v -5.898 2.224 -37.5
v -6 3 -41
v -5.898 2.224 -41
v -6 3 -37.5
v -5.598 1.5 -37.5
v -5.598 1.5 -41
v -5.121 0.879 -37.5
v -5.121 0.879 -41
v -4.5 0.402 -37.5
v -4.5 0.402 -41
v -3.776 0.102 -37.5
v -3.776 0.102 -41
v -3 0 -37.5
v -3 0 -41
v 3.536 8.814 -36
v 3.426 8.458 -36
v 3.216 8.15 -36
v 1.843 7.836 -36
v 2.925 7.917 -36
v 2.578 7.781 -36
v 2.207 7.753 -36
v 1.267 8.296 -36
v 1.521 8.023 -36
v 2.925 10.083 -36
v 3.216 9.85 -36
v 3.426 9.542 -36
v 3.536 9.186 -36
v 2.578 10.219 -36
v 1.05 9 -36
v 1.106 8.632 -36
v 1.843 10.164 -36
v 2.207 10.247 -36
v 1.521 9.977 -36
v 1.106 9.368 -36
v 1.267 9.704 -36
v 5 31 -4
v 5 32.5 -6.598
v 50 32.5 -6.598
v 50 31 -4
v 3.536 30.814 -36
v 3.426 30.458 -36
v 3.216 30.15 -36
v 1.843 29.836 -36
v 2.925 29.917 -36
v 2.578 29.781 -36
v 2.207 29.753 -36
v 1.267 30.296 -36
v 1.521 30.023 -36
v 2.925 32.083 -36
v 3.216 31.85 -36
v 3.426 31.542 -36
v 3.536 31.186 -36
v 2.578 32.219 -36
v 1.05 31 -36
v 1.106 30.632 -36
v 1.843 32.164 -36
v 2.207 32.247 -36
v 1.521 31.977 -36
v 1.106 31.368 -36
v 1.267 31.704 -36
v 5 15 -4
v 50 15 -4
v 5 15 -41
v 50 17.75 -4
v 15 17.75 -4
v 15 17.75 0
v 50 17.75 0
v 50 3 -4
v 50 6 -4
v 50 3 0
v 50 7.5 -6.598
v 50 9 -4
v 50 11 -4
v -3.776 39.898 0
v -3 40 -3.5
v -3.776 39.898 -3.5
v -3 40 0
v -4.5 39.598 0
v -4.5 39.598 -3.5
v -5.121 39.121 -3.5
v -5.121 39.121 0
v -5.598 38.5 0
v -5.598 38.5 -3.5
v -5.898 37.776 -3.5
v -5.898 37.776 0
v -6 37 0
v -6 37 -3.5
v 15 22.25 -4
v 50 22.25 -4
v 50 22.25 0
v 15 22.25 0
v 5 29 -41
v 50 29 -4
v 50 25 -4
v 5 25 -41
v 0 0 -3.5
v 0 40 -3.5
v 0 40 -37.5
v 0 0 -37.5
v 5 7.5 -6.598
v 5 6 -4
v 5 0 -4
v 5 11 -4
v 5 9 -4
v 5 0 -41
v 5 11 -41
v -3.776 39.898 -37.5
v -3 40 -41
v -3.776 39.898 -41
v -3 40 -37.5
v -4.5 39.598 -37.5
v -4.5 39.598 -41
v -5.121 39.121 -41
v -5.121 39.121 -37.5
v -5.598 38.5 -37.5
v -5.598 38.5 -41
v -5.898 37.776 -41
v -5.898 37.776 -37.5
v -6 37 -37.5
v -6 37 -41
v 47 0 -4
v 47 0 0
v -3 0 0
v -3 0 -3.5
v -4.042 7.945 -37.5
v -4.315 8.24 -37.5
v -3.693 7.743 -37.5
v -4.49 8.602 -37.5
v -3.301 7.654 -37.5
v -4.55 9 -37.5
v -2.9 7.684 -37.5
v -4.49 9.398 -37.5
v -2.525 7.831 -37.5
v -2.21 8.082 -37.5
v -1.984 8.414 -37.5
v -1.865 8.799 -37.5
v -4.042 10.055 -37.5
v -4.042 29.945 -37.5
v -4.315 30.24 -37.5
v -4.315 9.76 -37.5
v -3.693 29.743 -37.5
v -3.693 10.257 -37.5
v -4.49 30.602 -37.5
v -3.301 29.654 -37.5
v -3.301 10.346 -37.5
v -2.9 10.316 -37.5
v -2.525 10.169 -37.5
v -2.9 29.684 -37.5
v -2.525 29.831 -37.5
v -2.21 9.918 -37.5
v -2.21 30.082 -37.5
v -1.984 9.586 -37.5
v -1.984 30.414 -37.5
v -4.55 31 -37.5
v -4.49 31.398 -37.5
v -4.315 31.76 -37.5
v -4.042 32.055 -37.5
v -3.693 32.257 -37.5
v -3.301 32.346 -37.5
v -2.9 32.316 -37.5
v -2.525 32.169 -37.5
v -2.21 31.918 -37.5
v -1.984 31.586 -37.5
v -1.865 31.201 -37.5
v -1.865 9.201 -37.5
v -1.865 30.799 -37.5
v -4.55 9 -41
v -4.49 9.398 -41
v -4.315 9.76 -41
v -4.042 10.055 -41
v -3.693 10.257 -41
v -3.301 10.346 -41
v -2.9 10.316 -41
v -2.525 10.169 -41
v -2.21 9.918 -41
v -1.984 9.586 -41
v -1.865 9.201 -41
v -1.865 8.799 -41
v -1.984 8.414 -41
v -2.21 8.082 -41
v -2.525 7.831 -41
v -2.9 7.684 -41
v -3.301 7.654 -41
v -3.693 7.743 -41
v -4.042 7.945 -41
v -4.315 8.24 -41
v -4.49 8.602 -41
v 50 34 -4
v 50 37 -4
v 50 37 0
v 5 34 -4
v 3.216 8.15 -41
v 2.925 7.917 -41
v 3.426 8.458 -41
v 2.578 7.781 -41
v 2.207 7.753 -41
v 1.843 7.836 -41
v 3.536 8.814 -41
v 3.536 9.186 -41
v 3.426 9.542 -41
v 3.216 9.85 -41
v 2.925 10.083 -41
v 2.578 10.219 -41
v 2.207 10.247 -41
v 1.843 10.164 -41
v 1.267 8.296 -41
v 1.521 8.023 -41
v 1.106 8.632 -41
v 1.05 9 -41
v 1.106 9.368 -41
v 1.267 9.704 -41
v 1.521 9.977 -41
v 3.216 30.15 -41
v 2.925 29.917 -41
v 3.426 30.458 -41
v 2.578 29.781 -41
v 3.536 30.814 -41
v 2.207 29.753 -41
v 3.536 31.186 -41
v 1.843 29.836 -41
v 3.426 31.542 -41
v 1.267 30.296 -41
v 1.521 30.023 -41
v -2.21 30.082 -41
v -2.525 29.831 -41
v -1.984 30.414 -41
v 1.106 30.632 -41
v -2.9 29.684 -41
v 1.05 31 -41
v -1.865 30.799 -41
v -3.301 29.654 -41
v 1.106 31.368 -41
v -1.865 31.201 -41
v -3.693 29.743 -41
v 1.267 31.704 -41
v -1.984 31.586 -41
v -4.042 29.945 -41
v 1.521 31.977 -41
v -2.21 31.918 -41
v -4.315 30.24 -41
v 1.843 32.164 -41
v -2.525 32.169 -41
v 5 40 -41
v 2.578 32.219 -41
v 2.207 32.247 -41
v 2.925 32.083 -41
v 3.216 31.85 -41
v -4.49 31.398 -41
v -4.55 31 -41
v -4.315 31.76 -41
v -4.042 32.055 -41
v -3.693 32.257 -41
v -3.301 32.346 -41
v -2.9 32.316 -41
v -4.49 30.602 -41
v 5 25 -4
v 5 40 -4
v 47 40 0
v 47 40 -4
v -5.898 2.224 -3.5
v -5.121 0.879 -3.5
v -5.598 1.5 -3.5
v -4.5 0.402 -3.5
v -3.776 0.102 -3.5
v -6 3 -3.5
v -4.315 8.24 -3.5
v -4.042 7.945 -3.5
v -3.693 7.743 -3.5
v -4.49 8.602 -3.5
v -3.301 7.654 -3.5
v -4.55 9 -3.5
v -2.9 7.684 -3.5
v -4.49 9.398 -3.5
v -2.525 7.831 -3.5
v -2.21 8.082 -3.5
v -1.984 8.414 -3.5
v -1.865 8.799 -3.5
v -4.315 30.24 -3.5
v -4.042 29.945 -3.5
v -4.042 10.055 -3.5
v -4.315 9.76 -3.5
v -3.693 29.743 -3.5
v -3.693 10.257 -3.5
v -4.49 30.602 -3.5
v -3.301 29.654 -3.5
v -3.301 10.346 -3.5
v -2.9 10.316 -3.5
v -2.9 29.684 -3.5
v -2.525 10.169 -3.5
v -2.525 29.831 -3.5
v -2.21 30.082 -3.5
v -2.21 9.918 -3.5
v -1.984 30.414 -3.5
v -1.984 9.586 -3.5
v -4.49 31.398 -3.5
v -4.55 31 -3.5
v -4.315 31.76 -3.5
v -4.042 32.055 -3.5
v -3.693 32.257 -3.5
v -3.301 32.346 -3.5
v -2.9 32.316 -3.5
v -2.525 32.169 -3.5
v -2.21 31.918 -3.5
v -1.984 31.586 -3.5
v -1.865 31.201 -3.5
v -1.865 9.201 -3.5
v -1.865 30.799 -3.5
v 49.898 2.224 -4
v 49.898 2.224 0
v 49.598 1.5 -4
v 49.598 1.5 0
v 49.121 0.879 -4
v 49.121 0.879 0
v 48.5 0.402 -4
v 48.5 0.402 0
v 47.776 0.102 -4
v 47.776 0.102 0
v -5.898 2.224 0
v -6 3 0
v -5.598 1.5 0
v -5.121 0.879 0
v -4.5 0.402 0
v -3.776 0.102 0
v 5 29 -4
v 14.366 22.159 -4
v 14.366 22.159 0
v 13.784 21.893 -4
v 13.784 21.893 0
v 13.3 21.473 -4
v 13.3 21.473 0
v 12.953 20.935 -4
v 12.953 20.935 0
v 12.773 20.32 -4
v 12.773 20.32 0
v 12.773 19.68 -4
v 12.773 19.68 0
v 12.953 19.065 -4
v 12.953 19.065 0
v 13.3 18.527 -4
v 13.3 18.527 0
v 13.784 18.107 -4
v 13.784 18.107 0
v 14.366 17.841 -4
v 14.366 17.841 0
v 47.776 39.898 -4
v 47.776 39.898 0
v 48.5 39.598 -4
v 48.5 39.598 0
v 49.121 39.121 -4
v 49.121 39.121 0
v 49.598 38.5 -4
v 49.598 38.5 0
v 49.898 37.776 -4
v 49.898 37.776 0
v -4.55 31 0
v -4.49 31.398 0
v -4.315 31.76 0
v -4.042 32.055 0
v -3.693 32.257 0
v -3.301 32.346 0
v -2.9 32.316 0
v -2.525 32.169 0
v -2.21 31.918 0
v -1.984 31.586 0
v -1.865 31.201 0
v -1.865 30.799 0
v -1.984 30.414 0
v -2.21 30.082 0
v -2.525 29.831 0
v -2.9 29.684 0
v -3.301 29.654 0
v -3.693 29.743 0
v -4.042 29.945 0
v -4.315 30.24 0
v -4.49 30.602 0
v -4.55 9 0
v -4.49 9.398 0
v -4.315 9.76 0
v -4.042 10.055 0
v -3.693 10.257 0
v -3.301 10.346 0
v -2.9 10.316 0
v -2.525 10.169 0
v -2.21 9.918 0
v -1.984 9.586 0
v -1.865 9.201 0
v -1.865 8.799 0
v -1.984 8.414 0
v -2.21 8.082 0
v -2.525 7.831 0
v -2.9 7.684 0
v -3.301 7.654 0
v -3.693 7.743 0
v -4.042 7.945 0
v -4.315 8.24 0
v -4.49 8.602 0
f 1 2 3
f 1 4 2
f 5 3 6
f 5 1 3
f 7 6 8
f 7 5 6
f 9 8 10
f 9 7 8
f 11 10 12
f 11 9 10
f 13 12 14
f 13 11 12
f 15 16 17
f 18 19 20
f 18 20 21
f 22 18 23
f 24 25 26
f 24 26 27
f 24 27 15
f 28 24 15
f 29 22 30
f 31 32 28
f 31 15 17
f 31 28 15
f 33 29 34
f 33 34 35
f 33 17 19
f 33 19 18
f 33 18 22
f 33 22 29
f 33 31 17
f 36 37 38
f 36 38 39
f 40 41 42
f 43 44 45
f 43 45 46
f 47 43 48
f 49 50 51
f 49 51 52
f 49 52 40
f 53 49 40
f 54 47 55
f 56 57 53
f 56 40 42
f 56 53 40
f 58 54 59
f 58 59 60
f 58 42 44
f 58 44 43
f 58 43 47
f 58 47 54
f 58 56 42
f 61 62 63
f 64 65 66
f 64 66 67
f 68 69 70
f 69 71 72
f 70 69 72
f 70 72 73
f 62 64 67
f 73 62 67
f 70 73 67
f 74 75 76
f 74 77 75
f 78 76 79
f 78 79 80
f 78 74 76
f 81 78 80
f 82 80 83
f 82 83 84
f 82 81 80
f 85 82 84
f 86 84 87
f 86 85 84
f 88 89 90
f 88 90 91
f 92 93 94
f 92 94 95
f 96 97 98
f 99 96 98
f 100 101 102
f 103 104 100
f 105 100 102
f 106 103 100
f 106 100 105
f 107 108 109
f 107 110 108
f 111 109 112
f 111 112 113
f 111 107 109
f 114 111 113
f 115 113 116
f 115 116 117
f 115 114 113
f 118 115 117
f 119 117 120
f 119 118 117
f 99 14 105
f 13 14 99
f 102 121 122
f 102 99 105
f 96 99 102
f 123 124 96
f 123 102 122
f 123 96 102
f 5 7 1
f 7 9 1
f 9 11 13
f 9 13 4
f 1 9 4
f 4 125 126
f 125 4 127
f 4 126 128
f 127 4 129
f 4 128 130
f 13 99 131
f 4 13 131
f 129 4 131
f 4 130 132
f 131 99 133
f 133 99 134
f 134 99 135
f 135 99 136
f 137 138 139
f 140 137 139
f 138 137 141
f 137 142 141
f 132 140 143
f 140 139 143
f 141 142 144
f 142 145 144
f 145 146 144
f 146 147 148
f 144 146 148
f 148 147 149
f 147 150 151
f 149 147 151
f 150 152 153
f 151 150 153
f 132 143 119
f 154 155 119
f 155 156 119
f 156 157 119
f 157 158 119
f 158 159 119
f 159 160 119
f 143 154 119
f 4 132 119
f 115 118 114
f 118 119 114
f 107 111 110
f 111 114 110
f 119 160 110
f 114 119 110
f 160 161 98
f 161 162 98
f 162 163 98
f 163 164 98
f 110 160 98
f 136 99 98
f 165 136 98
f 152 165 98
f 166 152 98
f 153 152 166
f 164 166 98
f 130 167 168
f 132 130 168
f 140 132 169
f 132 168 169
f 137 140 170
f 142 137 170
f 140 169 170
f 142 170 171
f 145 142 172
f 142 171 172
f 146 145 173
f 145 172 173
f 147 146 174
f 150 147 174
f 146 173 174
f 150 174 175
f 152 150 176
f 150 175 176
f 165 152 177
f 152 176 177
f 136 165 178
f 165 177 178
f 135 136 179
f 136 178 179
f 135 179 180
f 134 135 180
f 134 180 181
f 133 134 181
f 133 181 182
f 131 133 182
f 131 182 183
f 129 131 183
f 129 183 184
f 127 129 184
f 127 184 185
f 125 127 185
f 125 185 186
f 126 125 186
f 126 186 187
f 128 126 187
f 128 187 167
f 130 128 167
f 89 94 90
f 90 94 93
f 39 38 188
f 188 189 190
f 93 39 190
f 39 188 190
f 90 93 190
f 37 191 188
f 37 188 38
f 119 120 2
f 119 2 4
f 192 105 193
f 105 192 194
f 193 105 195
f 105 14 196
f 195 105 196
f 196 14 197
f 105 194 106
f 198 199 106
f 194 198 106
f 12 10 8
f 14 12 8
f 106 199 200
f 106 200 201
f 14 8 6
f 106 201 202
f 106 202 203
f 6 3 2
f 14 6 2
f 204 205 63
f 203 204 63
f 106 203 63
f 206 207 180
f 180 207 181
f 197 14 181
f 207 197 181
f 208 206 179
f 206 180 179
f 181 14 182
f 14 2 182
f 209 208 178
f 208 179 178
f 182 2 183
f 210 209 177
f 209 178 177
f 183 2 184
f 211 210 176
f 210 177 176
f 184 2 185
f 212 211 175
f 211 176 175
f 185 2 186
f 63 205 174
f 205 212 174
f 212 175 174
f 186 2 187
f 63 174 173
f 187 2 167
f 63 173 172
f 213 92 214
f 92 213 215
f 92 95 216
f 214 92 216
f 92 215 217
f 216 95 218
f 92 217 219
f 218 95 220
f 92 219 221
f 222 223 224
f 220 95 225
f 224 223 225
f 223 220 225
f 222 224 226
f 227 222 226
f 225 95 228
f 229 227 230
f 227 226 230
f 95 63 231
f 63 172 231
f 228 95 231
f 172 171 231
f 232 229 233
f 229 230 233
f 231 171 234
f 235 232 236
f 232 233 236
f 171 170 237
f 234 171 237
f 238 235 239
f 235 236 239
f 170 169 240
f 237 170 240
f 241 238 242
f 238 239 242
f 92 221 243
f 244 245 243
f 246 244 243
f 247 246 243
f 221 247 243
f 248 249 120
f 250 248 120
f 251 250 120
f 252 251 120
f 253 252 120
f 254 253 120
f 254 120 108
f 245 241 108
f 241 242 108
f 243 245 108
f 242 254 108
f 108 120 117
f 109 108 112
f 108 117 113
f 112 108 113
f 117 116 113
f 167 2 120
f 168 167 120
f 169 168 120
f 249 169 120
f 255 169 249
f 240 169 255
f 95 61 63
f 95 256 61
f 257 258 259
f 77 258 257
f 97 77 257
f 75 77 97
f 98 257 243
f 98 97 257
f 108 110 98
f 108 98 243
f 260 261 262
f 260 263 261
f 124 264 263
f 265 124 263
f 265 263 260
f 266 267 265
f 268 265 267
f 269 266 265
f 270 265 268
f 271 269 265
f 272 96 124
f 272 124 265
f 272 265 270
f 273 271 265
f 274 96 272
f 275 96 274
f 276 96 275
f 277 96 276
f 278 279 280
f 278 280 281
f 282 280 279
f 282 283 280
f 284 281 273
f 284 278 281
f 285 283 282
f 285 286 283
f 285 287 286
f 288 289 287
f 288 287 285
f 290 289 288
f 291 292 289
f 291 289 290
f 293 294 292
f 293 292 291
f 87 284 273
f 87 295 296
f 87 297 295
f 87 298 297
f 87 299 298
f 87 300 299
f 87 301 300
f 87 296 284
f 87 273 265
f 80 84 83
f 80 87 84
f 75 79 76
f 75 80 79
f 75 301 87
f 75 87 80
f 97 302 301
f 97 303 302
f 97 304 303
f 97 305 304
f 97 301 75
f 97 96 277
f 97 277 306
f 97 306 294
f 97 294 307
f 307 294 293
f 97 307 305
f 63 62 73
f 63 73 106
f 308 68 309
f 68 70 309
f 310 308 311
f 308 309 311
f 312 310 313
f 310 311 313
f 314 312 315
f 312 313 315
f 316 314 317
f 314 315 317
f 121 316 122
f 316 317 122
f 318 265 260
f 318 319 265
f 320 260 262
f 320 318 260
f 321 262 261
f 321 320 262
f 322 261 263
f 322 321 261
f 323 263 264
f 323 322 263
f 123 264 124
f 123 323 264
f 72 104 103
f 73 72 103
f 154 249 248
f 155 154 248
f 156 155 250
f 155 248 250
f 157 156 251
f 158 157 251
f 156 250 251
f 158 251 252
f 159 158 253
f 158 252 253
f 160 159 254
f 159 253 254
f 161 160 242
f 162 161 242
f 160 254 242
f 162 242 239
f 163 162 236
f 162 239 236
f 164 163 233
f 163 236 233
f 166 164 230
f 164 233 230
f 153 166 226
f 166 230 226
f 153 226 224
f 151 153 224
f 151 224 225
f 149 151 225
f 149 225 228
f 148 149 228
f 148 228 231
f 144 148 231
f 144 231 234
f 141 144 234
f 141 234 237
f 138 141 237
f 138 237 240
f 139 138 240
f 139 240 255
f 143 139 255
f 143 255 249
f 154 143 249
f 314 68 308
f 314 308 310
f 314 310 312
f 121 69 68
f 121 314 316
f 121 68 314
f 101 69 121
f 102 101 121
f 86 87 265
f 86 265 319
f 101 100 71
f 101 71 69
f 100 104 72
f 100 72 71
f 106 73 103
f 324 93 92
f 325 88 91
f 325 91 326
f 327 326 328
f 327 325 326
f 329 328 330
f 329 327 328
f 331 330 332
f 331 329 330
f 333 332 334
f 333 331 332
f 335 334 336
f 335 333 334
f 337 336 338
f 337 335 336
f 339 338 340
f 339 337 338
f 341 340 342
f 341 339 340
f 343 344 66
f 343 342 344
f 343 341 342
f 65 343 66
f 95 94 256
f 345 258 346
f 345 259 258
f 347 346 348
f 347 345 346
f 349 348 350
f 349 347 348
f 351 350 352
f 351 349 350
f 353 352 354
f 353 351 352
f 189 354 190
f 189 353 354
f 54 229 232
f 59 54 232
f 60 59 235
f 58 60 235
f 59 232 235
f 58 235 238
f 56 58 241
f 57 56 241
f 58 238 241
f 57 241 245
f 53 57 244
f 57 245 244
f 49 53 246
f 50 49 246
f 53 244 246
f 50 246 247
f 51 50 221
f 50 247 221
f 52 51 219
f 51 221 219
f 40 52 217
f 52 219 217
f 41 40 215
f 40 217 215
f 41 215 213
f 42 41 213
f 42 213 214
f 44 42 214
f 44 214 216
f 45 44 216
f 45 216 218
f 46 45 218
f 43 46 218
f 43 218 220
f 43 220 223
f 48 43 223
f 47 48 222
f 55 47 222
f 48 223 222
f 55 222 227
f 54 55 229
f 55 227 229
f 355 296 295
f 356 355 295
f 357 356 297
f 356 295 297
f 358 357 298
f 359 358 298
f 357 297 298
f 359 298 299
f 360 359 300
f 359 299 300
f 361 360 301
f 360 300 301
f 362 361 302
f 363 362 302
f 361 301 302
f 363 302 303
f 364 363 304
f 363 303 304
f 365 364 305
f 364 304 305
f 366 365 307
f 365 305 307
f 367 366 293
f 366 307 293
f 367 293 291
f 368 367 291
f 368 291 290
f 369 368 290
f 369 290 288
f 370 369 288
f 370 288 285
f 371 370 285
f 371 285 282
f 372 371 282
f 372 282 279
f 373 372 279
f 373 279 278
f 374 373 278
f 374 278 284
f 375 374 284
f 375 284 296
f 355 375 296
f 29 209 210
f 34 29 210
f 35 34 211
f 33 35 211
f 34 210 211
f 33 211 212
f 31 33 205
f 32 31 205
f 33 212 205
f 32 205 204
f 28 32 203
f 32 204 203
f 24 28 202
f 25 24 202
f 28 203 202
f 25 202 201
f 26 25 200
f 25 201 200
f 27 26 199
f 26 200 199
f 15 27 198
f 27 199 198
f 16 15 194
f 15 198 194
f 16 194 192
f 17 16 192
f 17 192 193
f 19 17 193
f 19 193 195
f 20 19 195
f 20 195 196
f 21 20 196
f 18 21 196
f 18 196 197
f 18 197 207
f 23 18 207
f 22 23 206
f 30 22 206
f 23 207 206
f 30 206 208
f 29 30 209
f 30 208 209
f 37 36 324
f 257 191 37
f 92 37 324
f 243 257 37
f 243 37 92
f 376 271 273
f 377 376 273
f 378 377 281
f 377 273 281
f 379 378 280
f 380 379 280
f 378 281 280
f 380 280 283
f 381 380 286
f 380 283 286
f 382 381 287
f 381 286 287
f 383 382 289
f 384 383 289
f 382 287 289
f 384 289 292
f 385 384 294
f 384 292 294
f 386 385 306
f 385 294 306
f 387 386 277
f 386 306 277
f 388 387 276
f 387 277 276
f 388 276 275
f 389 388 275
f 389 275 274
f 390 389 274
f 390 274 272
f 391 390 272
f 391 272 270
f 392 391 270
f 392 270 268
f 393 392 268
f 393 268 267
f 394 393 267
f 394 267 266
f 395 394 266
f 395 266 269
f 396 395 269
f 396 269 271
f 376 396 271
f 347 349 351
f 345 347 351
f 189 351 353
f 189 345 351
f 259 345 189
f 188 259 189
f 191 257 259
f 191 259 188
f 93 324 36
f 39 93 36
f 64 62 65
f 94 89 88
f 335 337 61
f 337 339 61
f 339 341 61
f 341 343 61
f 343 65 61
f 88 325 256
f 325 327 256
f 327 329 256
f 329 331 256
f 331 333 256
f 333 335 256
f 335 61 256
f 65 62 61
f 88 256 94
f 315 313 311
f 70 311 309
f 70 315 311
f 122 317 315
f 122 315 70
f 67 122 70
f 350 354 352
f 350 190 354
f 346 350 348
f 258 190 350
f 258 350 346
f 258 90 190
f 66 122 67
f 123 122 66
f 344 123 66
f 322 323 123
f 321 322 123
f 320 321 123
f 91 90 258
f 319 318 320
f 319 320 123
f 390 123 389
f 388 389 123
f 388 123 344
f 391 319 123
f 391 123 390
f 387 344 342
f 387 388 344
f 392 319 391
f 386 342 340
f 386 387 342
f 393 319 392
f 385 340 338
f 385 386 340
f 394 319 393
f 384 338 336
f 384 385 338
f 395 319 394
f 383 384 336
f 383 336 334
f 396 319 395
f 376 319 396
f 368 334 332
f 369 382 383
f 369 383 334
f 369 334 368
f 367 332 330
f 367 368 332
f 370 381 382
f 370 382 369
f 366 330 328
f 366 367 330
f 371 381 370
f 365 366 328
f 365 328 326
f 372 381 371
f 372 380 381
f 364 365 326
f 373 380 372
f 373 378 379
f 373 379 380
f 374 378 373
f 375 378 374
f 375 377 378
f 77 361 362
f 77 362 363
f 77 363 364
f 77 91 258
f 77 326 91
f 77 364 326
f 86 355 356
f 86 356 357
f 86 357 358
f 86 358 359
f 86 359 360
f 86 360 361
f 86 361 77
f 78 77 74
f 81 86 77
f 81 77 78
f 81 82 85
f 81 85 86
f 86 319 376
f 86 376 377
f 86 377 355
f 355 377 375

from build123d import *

# Parameters (mm, degrees)
SKETCH_1_W               = 41
SKETCH_1_H               = 40
EXTRUDE_1_DEPTH          = 5
SKETCH_2_W               = 3.5
SKETCH_2_H               = 40
EXTRUDE_2_DEPTH          = 6
EXTRUDE_3_DEPTH          = 45
SKETCH_4_W               = 45
SKETCH_4_H               = 4
EXTRUDE_4_DEPTH          = 37
CUT_EXTRUDE_1_DEPTH      = 19
SKETCH_6_R               = 1.35
CUT_EXTRUDE_2_DEPTH      = 42
FILLET_1_R               = 3
FILLET_2_R               = 3
CUT_EXTRUDE_3_DEPTH      = 38
CUT_EXTRUDE_3_DEPTH_BACK = 5
SKETCH_8_R               = 1.25
CUT_EXTRUDE_4_DEPTH      = 5


with BuildPart() as part:
    # 스케치1 → 보스-돌출1 (new body)
    with BuildSketch(Plane(origin=(0, 0, 0), x_dir=(0, 0, -1), z_dir=(1, 0, 0))):
        with Locations((20.5, 20)):
            Rectangle(SKETCH_1_W, SKETCH_1_H)
    extrude(amount=EXTRUDE_1_DEPTH)

    # 스케치2 → 보스-돌출2 (add)
    with BuildSketch(Plane.ZY):
        with Locations((-1.75, 20)):
            Rectangle(SKETCH_2_W, SKETCH_2_H)
        with Locations((-39.25, 20)):
            Rectangle(SKETCH_2_W, SKETCH_2_H)
    extrude(amount=EXTRUDE_2_DEPTH)

    # 스케치3 → 보스-돌출3 (add)
    with BuildSketch(Plane(origin=(5, 0, 0), x_dir=(0, 0, -1), z_dir=(1, 0, 0))):
        Polygon((0, 40), (4, 40), (4, 34), (6.598076211, 32.5), (4, 31), (4, 14), (4, 12), (4, 9), (6.598076211, 7.5), (4, 6), (4, 0), (0, 0), align=None)
    extrude(amount=EXTRUDE_3_DEPTH)

    # 스케치4 → 보스-돌출4 (add)
    with BuildSketch(Plane(origin=(0, 0, -4), x_dir=(-1, 0, 0), z_dir=(0, 0, -1))):
        with Locations((-27.5, 27)):
            Rectangle(SKETCH_4_W, SKETCH_4_H)
        with Locations((-27.5, 13)):
            Rectangle(SKETCH_4_W, SKETCH_4_H)
    extrude(amount=EXTRUDE_4_DEPTH)

    # 스케치5 → 컷-돌출1 (cut)
    with BuildSketch(Plane(origin=(0, 29, 0), x_dir=(1, 0, 0), z_dir=(0, 1, 0))):
        Polygon((50, 4), (5, 41), (50, 41), align=None)
    extrude(amount=-CUT_EXTRUDE_1_DEPTH, mode=Mode.SUBTRACT)

    # 스케치6 → 컷-돌출2 (cut, through all)
    with BuildSketch(Plane(origin=(0, 0, -41), x_dir=(-1, 0, 0), z_dir=(0, 0, -1))):
        with Locations((3.2, 9)):
            Circle(SKETCH_6_R)
        with Locations((3.2, 31)):
            Circle(SKETCH_6_R)
    extrude(amount=-CUT_EXTRUDE_2_DEPTH, mode=Mode.SUBTRACT)

    # 필렛1
    fillet_1_edges = [part.edges().sort_by_distance(p)[0] for p in [
        (50, 0, -2),
        (50, 40, -2),
    ]]
    fillet(fillet_1_edges, radius=FILLET_1_R)

    # 필렛2
    fillet_2_edges = [part.edges().sort_by_distance(p)[0] for p in [
        (-6, 0, -1.75),
        (-6, 40, -1.75),
        (-6, 40, -39.25),
        (-6, 0, -39.25),
    ]]
    fillet(fillet_2_edges, radius=FILLET_2_R)

    # 스케치7 → 컷-돌출3 (cut, two sides)
    with BuildSketch(Plane(origin=(0, 0, -4), x_dir=(-1, 0, 0), z_dir=(0, 0, -1))) as cut_extrude_3_sk:
        with BuildLine():
            Line((-40, 22.25), (-15, 22.25))
            ThreePointArc((-15, 22.25), (-12.75, 20), (-15, 17.75))
            Line((-15, 17.75), (-40, 17.75))
            Line((-40, 17.75), (-50, 17.75))
            Line((-50, 17.75), (-50, 22.25))
            Line((-50, 22.25), (-40, 22.25))
        make_face()
    extrude(amount=CUT_EXTRUDE_3_DEPTH, mode=Mode.SUBTRACT)
    extrude(cut_extrude_3_sk.sketch, amount=-CUT_EXTRUDE_3_DEPTH_BACK, mode=Mode.SUBTRACT)

    # 스케치8 → 컷-돌출4 (cut)
    with BuildSketch(Plane(origin=(0, 0, -41), x_dir=(-1, 0, 0), z_dir=(0, 0, -1))):
        with Locations((-2.3, 31)):
            Circle(SKETCH_8_R)
        with Locations((-2.3, 9)):
            Circle(SKETCH_8_R)
    extrude(amount=-CUT_EXTRUDE_4_DEPTH, mode=Mode.SUBTRACT)


solid = part.part
